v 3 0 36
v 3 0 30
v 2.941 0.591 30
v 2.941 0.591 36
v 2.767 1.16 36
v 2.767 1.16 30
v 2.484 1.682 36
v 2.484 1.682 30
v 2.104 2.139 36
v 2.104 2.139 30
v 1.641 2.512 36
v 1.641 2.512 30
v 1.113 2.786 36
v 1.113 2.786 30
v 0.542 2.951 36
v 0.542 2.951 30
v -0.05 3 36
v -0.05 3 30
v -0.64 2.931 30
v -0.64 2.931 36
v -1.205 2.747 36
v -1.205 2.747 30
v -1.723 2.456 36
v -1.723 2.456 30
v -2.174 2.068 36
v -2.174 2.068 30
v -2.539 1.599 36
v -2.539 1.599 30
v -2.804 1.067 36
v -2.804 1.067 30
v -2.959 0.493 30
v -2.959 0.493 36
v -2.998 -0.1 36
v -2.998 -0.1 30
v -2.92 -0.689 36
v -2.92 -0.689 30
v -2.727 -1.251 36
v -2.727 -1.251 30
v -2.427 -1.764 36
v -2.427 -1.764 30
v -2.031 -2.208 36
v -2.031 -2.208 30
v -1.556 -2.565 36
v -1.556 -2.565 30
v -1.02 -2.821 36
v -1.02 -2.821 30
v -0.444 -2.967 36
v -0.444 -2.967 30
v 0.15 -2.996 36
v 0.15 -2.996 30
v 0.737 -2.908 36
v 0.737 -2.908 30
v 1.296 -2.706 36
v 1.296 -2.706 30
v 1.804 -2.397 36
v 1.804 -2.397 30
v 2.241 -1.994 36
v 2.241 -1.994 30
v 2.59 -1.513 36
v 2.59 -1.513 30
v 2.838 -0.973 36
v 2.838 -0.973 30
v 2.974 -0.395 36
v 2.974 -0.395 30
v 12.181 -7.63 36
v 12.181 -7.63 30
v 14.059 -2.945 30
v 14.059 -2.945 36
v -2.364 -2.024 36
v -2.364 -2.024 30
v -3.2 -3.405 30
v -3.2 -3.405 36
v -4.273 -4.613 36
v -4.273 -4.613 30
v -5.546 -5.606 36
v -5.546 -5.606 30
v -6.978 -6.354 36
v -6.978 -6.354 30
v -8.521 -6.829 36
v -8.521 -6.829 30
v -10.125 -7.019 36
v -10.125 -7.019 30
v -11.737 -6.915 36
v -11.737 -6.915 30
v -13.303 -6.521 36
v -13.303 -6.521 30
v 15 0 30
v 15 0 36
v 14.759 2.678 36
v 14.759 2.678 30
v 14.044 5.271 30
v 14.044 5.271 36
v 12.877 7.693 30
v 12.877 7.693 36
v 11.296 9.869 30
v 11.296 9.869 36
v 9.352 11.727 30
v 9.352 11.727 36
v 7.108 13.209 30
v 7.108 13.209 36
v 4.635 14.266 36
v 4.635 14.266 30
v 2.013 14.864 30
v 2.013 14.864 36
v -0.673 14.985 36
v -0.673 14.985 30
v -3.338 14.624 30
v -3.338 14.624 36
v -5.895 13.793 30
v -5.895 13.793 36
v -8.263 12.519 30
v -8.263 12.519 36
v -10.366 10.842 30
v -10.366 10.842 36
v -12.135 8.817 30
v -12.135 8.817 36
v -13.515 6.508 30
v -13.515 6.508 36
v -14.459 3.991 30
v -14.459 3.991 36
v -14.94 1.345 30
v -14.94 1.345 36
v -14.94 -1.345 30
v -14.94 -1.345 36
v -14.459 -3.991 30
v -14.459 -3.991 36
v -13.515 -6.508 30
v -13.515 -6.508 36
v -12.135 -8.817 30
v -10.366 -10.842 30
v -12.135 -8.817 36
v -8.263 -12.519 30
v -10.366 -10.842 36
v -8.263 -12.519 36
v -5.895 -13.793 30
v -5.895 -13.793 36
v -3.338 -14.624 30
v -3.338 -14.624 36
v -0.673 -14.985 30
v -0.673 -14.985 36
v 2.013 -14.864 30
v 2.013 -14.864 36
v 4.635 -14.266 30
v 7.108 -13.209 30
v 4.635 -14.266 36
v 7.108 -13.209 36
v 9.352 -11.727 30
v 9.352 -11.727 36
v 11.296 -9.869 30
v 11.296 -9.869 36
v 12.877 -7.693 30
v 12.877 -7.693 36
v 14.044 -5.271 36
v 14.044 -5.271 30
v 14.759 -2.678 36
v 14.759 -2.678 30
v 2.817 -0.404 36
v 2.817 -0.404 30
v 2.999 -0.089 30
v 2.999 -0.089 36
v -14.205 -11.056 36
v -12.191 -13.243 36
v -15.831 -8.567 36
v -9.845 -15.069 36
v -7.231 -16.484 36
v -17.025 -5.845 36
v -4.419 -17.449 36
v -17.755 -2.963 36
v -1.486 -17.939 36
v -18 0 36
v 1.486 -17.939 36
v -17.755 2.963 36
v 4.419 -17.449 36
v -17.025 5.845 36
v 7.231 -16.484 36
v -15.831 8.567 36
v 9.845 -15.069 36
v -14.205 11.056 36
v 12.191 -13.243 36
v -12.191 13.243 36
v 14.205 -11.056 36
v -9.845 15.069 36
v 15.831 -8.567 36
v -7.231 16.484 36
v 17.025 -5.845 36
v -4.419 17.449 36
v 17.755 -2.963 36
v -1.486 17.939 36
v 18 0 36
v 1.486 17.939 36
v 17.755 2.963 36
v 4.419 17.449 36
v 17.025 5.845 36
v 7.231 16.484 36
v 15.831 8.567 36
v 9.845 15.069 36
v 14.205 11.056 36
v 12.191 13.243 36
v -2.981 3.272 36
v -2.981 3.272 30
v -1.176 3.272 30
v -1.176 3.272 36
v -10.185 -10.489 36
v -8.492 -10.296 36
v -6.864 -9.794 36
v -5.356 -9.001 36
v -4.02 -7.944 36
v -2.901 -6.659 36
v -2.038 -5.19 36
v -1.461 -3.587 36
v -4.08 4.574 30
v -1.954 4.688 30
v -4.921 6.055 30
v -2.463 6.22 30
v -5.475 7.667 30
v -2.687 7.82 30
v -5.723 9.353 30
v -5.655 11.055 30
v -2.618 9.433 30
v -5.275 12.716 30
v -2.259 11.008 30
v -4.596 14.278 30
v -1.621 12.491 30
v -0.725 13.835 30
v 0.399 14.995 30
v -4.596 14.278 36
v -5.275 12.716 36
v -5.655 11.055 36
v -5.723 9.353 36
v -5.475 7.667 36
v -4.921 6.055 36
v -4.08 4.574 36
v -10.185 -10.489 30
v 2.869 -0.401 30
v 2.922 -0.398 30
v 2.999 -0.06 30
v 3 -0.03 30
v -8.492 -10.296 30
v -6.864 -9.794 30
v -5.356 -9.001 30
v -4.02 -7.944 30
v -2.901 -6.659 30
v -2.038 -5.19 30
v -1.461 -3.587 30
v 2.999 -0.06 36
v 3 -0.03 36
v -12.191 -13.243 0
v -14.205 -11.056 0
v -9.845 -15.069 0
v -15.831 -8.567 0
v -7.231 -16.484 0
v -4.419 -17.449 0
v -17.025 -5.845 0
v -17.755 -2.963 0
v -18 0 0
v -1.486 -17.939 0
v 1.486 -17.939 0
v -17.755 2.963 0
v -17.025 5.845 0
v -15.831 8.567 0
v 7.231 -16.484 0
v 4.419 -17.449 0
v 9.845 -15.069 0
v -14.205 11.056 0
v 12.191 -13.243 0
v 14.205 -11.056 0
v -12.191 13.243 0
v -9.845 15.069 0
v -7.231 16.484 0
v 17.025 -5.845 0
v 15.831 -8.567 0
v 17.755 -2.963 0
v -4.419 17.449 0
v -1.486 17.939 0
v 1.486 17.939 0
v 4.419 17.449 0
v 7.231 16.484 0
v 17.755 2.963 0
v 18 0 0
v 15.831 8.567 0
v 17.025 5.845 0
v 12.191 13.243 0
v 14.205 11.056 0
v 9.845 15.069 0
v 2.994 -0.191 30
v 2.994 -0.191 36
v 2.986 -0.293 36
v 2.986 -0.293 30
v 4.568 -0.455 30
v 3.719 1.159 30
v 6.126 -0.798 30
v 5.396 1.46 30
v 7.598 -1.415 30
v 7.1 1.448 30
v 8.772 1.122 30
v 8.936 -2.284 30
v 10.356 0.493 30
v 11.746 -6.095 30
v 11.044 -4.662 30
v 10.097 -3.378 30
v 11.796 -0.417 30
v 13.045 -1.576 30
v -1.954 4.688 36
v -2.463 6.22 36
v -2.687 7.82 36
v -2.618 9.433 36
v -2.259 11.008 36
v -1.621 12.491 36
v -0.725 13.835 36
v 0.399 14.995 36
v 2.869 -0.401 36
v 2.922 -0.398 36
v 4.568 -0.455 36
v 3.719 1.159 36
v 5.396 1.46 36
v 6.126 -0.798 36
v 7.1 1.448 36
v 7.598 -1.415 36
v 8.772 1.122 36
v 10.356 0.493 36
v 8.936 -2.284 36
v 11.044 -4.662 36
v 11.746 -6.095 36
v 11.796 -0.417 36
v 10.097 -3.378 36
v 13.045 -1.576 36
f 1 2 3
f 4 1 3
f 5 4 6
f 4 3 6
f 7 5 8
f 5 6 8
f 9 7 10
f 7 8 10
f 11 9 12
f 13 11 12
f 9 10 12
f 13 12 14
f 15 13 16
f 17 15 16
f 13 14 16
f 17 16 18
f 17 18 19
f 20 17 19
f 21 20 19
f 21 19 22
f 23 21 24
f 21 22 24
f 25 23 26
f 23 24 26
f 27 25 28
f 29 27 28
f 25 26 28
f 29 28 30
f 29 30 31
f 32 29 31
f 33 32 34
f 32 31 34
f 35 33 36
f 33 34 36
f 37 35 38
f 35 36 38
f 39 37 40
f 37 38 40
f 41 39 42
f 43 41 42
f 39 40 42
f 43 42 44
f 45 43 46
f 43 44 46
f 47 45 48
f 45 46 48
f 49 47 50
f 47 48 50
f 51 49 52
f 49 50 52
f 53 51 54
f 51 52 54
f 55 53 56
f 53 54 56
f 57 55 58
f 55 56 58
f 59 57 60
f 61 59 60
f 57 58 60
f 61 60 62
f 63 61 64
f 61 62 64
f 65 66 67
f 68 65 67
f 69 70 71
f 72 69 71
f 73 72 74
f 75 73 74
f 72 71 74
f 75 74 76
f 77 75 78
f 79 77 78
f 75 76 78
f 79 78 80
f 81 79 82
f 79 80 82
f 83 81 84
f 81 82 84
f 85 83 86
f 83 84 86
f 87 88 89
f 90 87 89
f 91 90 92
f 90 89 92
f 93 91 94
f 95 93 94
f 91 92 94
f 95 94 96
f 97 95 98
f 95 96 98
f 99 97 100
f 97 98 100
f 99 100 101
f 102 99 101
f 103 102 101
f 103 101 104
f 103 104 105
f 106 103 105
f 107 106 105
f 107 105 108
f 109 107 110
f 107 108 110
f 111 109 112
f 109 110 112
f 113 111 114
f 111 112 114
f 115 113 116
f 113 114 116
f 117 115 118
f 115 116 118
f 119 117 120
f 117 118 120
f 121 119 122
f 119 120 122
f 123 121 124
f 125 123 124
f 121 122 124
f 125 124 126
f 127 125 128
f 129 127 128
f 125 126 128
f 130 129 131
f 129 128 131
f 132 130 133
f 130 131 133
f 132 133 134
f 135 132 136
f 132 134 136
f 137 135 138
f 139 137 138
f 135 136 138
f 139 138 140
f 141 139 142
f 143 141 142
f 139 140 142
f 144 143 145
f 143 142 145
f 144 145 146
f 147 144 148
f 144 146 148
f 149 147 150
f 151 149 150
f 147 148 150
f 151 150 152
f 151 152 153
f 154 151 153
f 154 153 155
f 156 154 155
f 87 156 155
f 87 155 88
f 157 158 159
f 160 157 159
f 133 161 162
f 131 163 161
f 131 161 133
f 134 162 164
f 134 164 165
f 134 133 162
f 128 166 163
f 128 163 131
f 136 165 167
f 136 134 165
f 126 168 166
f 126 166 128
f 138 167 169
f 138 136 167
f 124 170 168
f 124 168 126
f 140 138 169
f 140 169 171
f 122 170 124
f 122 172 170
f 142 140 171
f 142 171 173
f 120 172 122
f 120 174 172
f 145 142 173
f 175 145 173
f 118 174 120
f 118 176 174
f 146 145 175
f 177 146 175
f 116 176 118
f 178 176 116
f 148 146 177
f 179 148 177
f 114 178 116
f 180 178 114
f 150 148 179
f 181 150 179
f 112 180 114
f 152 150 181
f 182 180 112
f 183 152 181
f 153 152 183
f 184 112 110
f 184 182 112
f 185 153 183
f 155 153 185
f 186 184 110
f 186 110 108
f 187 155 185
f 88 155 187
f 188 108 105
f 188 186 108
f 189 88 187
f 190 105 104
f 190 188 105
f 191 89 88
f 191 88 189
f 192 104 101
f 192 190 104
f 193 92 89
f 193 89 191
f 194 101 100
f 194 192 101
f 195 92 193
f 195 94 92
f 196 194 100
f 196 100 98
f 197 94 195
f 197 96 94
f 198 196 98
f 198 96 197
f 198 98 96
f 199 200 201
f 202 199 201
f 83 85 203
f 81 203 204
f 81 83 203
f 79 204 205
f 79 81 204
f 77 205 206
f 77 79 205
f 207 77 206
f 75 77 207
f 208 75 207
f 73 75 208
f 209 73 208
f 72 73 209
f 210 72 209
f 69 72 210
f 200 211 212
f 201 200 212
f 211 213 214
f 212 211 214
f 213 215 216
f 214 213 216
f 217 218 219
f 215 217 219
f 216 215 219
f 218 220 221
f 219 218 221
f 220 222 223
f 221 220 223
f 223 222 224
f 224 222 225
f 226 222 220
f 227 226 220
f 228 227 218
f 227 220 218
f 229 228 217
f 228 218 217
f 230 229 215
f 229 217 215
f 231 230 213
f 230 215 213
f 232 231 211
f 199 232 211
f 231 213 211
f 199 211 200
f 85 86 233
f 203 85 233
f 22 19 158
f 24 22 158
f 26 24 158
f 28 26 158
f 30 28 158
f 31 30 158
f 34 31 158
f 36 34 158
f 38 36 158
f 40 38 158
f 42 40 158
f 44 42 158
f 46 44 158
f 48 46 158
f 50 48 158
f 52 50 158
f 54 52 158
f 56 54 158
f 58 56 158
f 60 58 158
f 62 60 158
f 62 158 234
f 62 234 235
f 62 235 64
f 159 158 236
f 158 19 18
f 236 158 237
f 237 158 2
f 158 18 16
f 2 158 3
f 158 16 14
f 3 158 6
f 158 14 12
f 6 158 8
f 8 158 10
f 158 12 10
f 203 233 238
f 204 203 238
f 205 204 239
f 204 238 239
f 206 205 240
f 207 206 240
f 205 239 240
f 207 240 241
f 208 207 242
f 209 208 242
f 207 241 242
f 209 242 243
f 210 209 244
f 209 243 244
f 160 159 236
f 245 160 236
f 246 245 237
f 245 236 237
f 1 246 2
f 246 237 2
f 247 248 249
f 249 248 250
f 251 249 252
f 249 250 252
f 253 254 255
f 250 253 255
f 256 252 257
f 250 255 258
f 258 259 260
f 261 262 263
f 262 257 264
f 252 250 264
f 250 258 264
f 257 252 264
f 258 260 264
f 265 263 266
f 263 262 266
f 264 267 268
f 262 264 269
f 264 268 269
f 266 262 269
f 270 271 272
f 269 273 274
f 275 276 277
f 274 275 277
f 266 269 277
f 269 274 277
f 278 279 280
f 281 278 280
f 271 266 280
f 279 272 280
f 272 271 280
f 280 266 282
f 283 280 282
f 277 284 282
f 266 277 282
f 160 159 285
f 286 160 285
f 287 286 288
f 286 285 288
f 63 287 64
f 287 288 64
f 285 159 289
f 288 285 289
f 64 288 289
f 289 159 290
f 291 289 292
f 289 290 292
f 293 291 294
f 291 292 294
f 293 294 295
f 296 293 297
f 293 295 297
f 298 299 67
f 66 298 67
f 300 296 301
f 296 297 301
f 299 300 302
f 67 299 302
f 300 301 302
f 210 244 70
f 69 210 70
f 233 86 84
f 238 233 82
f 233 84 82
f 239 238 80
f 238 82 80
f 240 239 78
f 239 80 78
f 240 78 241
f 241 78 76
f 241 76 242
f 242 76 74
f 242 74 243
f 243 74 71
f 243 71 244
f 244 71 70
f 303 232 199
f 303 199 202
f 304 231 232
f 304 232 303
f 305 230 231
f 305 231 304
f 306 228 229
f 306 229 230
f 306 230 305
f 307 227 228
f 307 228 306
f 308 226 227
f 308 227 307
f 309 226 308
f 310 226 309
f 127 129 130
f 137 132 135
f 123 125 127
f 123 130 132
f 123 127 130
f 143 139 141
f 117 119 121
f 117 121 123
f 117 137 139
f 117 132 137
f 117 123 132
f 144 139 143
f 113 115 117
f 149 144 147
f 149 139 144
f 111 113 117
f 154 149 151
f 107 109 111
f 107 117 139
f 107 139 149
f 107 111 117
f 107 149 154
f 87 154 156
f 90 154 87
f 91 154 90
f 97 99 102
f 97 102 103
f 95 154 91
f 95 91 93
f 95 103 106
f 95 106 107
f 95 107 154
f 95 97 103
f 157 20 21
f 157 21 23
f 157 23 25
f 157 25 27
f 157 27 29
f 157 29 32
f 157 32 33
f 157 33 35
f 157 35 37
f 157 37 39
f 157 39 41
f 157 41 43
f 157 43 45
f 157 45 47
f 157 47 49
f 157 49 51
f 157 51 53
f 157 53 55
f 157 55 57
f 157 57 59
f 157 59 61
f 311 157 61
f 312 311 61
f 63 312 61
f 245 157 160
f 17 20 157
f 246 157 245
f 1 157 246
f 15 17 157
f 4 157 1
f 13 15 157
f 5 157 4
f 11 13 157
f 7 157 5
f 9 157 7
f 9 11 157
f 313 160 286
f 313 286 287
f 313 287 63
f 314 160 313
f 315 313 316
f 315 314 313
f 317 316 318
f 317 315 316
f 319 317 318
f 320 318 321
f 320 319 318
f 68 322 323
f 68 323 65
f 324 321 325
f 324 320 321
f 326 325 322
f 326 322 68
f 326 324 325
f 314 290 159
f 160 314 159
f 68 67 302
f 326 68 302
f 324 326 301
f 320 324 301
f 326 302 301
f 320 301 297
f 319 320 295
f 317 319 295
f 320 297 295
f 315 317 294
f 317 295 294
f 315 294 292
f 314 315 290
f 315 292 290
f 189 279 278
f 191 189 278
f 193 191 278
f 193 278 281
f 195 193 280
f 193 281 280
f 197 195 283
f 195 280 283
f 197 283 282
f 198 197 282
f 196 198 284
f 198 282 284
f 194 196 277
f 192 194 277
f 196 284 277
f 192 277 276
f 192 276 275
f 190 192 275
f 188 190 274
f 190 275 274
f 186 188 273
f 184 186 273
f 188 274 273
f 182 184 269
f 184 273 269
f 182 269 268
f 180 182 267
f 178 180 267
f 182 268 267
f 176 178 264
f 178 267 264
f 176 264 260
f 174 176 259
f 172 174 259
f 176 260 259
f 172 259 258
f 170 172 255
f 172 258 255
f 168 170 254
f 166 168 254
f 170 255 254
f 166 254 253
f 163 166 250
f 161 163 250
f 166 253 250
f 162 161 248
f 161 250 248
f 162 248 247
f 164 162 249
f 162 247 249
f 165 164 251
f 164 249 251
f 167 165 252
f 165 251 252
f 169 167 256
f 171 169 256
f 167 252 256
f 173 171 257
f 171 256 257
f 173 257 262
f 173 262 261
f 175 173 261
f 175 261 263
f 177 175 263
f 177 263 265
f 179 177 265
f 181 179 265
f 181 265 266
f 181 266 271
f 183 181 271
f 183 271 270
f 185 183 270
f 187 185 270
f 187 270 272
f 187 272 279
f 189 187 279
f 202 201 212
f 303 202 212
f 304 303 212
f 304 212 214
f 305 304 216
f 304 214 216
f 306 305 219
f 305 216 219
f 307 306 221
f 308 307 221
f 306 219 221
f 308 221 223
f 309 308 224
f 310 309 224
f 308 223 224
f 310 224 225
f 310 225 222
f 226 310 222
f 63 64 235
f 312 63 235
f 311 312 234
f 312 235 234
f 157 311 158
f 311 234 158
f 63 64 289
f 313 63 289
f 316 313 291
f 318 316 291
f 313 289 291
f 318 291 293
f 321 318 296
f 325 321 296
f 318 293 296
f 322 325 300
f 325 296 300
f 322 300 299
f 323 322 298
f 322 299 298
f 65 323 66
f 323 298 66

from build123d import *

# Parameters (mm, degrees)
F0_R     = 18
F1_DEPTH = 36
F2_R     = 15
F3_DEPTH = 6
F5_DEPTH = 6


with BuildPart() as f1:
    # F0 (on Top) → F1 (new body)
    with BuildSketch(Plane.XY):
        Circle(F0_R)
    extrude(amount=F1_DEPTH)

    # F2 (on face) → F3 (cut)
    with BuildSketch(Plane.XY.offset(36)):
        Circle(F2_R)
    extrude(amount=-F3_DEPTH, mode=Mode.SUBTRACT)


with BuildPart() as f5:
    # F4 (on face) → F5 (new body)
    with BuildSketch(Plane.XY.offset(30)):
        with BuildLine():
            Line((-13.30305, -6.52112), (-10.185073, -10.48913))
            ThreePointArc((-10.185073, -10.48913), (-4.663397, -8.503883), (-1.461136, -3.587011))
            Line((-1.461136, -3.587011), (-2.363547, -2.023989))
            ThreePointArc((-2.363547, -2.023989), (-6.977831, -6.353522), (-13.30305, -6.52112))
        make_face()
        with BuildLine():
            Line((12.181258, -7.629617), (14.058667, -2.945364))
            ThreePointArc((14.058667, -2.945364), (9.578554, 0.843923), (3.719288, 1.158727))
            Line((3.719288, 1.158727), (2.998667, -0.089424))
            ThreePointArc((2.998667, -0.089424), (2.990193, -0.242374), (2.973923, -0.394692))
            ThreePointArc((2.973923, -0.394692), (8.935577, -2.283948), (12.181258, -7.629617))
        make_face()
        with BuildLine():
            ThreePointArc((3, 0), (-2.993474, 0.197776), (2.973923, -0.394692))
            ThreePointArc((2.973923, -0.394692), (2.895379, -0.399146), (2.816876, -0.404295))
            Line((2.816876, -0.404295), (2.998667, -0.089424))
            ThreePointArc((2.998667, -0.089424), (2.999667, -0.044717), (3, 0))
        make_face()
        with BuildLine():
            Line((0.39909, 14.99469), (-4.596296, 14.278448))
            ThreePointArc((-4.596296, 14.278448), (-5.637859, 8.503912), (-2.980854, 3.272236))
            Line((-2.980854, 3.272236), (-1.176032, 3.272236))
            ThreePointArc((-1.176032, 3.272236), (-2.618375, 9.433091), (0.39909, 14.99469))
        make_face()
    extrude(amount=F5_DEPTH)


solid = Compound([f1.part, f5.part])
